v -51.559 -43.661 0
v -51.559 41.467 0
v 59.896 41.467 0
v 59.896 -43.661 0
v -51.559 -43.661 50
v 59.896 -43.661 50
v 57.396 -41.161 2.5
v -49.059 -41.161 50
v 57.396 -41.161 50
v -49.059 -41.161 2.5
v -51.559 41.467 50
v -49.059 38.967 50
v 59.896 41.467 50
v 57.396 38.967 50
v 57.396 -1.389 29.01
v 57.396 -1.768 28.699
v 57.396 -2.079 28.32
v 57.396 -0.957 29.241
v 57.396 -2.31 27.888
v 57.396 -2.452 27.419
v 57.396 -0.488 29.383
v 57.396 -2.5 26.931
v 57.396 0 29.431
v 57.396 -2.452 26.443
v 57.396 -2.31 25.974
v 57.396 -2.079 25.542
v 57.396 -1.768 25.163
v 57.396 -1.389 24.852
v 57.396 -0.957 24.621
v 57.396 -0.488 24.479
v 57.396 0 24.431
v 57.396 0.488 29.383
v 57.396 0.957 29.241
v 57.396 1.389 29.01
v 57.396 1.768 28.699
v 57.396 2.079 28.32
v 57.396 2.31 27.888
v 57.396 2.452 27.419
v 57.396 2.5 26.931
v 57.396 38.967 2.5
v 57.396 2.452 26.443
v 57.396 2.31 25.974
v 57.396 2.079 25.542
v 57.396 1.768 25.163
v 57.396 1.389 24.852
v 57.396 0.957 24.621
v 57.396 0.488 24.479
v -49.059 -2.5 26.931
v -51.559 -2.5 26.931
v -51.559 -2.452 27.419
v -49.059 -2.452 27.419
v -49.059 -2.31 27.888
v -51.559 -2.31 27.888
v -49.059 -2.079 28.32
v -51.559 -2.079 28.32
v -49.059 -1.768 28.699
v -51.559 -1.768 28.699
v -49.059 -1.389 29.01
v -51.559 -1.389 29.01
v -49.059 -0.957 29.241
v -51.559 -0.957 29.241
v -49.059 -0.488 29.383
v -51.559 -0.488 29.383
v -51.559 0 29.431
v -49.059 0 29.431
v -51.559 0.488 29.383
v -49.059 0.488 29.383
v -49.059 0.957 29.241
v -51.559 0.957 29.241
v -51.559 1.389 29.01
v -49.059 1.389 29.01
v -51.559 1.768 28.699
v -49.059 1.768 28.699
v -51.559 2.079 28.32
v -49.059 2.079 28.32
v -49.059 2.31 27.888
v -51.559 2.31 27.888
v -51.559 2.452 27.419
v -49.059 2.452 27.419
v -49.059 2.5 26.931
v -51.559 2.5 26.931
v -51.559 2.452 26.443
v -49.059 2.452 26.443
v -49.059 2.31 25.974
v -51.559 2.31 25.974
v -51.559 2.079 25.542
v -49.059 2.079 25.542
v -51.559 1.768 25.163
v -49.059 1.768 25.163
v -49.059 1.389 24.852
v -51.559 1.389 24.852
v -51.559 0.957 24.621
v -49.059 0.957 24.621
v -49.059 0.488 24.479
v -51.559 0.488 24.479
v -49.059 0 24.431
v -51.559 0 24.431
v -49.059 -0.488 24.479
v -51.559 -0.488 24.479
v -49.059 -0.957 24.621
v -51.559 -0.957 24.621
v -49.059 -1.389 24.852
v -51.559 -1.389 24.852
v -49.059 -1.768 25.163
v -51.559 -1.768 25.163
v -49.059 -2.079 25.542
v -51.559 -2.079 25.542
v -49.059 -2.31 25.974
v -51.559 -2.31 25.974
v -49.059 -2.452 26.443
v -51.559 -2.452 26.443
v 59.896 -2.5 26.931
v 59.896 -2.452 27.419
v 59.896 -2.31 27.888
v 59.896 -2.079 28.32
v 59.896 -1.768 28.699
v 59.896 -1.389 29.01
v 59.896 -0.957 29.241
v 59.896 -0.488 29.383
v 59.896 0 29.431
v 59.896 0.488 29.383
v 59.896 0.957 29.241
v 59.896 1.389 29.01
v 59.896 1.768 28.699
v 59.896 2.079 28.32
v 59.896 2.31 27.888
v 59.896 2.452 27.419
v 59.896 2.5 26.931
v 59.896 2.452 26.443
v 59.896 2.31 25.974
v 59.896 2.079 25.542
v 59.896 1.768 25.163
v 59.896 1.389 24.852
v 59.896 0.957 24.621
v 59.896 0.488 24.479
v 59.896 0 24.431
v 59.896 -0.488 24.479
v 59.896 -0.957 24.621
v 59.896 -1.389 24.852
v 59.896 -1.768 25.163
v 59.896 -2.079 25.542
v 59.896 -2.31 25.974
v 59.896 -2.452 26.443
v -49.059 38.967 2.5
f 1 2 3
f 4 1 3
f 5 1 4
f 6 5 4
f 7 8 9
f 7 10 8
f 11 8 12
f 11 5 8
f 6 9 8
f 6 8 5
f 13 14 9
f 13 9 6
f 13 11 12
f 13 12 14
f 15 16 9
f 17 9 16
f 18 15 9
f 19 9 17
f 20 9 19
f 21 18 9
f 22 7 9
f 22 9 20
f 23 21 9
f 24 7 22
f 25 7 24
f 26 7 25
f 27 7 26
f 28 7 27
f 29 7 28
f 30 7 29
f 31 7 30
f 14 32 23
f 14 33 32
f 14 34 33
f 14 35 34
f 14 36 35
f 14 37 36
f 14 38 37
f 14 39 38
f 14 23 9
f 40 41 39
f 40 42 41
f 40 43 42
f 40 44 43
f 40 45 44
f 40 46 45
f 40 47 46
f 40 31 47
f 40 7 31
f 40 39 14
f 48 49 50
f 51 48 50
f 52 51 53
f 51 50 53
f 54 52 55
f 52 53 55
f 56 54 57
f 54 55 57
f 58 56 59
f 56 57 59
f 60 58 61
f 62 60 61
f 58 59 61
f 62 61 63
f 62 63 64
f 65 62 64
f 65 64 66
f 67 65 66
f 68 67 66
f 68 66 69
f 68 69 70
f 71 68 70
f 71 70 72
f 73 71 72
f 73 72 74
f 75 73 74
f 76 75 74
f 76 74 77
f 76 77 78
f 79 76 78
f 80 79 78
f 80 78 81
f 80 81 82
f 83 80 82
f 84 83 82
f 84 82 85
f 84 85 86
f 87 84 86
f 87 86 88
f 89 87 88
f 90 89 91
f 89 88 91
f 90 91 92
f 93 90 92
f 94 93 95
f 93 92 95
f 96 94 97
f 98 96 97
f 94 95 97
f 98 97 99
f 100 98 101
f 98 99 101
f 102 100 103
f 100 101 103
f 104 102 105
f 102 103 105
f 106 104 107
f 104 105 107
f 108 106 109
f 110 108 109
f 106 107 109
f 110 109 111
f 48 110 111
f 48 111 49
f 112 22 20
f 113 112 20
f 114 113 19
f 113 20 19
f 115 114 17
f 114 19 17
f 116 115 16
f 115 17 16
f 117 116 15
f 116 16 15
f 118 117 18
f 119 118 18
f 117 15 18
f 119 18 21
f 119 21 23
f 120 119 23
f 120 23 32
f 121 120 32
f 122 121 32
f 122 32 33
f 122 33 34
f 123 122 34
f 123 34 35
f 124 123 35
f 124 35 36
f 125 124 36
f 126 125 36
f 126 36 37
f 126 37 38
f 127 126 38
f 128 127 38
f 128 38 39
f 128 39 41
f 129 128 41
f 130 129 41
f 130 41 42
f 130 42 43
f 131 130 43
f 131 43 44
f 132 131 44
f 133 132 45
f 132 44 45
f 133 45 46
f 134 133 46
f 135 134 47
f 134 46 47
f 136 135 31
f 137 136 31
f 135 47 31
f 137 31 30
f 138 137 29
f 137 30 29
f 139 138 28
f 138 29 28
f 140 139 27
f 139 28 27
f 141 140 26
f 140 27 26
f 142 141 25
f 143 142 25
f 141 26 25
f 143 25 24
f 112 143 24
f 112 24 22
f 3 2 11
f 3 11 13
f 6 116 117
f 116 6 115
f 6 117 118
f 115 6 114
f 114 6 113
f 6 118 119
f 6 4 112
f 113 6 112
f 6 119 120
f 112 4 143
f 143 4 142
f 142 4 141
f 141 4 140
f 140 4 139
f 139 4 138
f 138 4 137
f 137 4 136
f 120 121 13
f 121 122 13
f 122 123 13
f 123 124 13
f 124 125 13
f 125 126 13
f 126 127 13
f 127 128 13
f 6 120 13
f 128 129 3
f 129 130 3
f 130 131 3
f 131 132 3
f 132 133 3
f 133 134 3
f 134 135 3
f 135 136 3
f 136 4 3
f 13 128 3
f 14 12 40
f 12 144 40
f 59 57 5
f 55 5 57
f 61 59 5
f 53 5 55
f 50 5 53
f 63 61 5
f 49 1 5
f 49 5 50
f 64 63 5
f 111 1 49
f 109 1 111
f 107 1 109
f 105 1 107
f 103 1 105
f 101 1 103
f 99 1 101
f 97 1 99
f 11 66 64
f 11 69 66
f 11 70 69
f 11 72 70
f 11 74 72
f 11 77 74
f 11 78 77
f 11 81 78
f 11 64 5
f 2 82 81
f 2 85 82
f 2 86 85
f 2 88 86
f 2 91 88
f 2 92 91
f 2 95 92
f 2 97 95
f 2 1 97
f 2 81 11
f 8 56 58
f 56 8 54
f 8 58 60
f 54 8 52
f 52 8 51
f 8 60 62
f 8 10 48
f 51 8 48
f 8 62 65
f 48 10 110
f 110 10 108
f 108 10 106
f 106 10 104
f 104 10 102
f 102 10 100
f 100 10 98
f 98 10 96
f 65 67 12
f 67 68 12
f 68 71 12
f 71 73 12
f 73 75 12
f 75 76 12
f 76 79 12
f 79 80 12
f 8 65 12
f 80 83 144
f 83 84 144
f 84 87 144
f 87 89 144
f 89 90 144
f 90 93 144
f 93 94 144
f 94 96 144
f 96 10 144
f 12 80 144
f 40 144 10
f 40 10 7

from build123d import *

# Parameters (mm, degrees)
F0_W     = 111.455526
F0_H     = 85.127451
F1_DEPTH = 50
F2_T     = -2.5
F4_D     = 5


with BuildPart() as f1:
    # F0 (on Top) → F1 (new body)
    with BuildSketch(Plane.XY):
        with Locations((4.168613, -1.096998)):
            Rectangle(F0_W, F0_H)
    extrude(amount=F1_DEPTH)

    # F2
    f2_openings = [f1.faces().sort_by_distance(p)[0] for p in [
        (4.168613, -1.096997, 50),
    ]]
    offset(amount=F2_T, openings=f2_openings)

    # F4 (through all)
    with Locations(Plane.YZ.offset(59.896376)):
        with Locations((0, 26.930908)):
            Hole(F4_D / 2)


solid = f1.part
